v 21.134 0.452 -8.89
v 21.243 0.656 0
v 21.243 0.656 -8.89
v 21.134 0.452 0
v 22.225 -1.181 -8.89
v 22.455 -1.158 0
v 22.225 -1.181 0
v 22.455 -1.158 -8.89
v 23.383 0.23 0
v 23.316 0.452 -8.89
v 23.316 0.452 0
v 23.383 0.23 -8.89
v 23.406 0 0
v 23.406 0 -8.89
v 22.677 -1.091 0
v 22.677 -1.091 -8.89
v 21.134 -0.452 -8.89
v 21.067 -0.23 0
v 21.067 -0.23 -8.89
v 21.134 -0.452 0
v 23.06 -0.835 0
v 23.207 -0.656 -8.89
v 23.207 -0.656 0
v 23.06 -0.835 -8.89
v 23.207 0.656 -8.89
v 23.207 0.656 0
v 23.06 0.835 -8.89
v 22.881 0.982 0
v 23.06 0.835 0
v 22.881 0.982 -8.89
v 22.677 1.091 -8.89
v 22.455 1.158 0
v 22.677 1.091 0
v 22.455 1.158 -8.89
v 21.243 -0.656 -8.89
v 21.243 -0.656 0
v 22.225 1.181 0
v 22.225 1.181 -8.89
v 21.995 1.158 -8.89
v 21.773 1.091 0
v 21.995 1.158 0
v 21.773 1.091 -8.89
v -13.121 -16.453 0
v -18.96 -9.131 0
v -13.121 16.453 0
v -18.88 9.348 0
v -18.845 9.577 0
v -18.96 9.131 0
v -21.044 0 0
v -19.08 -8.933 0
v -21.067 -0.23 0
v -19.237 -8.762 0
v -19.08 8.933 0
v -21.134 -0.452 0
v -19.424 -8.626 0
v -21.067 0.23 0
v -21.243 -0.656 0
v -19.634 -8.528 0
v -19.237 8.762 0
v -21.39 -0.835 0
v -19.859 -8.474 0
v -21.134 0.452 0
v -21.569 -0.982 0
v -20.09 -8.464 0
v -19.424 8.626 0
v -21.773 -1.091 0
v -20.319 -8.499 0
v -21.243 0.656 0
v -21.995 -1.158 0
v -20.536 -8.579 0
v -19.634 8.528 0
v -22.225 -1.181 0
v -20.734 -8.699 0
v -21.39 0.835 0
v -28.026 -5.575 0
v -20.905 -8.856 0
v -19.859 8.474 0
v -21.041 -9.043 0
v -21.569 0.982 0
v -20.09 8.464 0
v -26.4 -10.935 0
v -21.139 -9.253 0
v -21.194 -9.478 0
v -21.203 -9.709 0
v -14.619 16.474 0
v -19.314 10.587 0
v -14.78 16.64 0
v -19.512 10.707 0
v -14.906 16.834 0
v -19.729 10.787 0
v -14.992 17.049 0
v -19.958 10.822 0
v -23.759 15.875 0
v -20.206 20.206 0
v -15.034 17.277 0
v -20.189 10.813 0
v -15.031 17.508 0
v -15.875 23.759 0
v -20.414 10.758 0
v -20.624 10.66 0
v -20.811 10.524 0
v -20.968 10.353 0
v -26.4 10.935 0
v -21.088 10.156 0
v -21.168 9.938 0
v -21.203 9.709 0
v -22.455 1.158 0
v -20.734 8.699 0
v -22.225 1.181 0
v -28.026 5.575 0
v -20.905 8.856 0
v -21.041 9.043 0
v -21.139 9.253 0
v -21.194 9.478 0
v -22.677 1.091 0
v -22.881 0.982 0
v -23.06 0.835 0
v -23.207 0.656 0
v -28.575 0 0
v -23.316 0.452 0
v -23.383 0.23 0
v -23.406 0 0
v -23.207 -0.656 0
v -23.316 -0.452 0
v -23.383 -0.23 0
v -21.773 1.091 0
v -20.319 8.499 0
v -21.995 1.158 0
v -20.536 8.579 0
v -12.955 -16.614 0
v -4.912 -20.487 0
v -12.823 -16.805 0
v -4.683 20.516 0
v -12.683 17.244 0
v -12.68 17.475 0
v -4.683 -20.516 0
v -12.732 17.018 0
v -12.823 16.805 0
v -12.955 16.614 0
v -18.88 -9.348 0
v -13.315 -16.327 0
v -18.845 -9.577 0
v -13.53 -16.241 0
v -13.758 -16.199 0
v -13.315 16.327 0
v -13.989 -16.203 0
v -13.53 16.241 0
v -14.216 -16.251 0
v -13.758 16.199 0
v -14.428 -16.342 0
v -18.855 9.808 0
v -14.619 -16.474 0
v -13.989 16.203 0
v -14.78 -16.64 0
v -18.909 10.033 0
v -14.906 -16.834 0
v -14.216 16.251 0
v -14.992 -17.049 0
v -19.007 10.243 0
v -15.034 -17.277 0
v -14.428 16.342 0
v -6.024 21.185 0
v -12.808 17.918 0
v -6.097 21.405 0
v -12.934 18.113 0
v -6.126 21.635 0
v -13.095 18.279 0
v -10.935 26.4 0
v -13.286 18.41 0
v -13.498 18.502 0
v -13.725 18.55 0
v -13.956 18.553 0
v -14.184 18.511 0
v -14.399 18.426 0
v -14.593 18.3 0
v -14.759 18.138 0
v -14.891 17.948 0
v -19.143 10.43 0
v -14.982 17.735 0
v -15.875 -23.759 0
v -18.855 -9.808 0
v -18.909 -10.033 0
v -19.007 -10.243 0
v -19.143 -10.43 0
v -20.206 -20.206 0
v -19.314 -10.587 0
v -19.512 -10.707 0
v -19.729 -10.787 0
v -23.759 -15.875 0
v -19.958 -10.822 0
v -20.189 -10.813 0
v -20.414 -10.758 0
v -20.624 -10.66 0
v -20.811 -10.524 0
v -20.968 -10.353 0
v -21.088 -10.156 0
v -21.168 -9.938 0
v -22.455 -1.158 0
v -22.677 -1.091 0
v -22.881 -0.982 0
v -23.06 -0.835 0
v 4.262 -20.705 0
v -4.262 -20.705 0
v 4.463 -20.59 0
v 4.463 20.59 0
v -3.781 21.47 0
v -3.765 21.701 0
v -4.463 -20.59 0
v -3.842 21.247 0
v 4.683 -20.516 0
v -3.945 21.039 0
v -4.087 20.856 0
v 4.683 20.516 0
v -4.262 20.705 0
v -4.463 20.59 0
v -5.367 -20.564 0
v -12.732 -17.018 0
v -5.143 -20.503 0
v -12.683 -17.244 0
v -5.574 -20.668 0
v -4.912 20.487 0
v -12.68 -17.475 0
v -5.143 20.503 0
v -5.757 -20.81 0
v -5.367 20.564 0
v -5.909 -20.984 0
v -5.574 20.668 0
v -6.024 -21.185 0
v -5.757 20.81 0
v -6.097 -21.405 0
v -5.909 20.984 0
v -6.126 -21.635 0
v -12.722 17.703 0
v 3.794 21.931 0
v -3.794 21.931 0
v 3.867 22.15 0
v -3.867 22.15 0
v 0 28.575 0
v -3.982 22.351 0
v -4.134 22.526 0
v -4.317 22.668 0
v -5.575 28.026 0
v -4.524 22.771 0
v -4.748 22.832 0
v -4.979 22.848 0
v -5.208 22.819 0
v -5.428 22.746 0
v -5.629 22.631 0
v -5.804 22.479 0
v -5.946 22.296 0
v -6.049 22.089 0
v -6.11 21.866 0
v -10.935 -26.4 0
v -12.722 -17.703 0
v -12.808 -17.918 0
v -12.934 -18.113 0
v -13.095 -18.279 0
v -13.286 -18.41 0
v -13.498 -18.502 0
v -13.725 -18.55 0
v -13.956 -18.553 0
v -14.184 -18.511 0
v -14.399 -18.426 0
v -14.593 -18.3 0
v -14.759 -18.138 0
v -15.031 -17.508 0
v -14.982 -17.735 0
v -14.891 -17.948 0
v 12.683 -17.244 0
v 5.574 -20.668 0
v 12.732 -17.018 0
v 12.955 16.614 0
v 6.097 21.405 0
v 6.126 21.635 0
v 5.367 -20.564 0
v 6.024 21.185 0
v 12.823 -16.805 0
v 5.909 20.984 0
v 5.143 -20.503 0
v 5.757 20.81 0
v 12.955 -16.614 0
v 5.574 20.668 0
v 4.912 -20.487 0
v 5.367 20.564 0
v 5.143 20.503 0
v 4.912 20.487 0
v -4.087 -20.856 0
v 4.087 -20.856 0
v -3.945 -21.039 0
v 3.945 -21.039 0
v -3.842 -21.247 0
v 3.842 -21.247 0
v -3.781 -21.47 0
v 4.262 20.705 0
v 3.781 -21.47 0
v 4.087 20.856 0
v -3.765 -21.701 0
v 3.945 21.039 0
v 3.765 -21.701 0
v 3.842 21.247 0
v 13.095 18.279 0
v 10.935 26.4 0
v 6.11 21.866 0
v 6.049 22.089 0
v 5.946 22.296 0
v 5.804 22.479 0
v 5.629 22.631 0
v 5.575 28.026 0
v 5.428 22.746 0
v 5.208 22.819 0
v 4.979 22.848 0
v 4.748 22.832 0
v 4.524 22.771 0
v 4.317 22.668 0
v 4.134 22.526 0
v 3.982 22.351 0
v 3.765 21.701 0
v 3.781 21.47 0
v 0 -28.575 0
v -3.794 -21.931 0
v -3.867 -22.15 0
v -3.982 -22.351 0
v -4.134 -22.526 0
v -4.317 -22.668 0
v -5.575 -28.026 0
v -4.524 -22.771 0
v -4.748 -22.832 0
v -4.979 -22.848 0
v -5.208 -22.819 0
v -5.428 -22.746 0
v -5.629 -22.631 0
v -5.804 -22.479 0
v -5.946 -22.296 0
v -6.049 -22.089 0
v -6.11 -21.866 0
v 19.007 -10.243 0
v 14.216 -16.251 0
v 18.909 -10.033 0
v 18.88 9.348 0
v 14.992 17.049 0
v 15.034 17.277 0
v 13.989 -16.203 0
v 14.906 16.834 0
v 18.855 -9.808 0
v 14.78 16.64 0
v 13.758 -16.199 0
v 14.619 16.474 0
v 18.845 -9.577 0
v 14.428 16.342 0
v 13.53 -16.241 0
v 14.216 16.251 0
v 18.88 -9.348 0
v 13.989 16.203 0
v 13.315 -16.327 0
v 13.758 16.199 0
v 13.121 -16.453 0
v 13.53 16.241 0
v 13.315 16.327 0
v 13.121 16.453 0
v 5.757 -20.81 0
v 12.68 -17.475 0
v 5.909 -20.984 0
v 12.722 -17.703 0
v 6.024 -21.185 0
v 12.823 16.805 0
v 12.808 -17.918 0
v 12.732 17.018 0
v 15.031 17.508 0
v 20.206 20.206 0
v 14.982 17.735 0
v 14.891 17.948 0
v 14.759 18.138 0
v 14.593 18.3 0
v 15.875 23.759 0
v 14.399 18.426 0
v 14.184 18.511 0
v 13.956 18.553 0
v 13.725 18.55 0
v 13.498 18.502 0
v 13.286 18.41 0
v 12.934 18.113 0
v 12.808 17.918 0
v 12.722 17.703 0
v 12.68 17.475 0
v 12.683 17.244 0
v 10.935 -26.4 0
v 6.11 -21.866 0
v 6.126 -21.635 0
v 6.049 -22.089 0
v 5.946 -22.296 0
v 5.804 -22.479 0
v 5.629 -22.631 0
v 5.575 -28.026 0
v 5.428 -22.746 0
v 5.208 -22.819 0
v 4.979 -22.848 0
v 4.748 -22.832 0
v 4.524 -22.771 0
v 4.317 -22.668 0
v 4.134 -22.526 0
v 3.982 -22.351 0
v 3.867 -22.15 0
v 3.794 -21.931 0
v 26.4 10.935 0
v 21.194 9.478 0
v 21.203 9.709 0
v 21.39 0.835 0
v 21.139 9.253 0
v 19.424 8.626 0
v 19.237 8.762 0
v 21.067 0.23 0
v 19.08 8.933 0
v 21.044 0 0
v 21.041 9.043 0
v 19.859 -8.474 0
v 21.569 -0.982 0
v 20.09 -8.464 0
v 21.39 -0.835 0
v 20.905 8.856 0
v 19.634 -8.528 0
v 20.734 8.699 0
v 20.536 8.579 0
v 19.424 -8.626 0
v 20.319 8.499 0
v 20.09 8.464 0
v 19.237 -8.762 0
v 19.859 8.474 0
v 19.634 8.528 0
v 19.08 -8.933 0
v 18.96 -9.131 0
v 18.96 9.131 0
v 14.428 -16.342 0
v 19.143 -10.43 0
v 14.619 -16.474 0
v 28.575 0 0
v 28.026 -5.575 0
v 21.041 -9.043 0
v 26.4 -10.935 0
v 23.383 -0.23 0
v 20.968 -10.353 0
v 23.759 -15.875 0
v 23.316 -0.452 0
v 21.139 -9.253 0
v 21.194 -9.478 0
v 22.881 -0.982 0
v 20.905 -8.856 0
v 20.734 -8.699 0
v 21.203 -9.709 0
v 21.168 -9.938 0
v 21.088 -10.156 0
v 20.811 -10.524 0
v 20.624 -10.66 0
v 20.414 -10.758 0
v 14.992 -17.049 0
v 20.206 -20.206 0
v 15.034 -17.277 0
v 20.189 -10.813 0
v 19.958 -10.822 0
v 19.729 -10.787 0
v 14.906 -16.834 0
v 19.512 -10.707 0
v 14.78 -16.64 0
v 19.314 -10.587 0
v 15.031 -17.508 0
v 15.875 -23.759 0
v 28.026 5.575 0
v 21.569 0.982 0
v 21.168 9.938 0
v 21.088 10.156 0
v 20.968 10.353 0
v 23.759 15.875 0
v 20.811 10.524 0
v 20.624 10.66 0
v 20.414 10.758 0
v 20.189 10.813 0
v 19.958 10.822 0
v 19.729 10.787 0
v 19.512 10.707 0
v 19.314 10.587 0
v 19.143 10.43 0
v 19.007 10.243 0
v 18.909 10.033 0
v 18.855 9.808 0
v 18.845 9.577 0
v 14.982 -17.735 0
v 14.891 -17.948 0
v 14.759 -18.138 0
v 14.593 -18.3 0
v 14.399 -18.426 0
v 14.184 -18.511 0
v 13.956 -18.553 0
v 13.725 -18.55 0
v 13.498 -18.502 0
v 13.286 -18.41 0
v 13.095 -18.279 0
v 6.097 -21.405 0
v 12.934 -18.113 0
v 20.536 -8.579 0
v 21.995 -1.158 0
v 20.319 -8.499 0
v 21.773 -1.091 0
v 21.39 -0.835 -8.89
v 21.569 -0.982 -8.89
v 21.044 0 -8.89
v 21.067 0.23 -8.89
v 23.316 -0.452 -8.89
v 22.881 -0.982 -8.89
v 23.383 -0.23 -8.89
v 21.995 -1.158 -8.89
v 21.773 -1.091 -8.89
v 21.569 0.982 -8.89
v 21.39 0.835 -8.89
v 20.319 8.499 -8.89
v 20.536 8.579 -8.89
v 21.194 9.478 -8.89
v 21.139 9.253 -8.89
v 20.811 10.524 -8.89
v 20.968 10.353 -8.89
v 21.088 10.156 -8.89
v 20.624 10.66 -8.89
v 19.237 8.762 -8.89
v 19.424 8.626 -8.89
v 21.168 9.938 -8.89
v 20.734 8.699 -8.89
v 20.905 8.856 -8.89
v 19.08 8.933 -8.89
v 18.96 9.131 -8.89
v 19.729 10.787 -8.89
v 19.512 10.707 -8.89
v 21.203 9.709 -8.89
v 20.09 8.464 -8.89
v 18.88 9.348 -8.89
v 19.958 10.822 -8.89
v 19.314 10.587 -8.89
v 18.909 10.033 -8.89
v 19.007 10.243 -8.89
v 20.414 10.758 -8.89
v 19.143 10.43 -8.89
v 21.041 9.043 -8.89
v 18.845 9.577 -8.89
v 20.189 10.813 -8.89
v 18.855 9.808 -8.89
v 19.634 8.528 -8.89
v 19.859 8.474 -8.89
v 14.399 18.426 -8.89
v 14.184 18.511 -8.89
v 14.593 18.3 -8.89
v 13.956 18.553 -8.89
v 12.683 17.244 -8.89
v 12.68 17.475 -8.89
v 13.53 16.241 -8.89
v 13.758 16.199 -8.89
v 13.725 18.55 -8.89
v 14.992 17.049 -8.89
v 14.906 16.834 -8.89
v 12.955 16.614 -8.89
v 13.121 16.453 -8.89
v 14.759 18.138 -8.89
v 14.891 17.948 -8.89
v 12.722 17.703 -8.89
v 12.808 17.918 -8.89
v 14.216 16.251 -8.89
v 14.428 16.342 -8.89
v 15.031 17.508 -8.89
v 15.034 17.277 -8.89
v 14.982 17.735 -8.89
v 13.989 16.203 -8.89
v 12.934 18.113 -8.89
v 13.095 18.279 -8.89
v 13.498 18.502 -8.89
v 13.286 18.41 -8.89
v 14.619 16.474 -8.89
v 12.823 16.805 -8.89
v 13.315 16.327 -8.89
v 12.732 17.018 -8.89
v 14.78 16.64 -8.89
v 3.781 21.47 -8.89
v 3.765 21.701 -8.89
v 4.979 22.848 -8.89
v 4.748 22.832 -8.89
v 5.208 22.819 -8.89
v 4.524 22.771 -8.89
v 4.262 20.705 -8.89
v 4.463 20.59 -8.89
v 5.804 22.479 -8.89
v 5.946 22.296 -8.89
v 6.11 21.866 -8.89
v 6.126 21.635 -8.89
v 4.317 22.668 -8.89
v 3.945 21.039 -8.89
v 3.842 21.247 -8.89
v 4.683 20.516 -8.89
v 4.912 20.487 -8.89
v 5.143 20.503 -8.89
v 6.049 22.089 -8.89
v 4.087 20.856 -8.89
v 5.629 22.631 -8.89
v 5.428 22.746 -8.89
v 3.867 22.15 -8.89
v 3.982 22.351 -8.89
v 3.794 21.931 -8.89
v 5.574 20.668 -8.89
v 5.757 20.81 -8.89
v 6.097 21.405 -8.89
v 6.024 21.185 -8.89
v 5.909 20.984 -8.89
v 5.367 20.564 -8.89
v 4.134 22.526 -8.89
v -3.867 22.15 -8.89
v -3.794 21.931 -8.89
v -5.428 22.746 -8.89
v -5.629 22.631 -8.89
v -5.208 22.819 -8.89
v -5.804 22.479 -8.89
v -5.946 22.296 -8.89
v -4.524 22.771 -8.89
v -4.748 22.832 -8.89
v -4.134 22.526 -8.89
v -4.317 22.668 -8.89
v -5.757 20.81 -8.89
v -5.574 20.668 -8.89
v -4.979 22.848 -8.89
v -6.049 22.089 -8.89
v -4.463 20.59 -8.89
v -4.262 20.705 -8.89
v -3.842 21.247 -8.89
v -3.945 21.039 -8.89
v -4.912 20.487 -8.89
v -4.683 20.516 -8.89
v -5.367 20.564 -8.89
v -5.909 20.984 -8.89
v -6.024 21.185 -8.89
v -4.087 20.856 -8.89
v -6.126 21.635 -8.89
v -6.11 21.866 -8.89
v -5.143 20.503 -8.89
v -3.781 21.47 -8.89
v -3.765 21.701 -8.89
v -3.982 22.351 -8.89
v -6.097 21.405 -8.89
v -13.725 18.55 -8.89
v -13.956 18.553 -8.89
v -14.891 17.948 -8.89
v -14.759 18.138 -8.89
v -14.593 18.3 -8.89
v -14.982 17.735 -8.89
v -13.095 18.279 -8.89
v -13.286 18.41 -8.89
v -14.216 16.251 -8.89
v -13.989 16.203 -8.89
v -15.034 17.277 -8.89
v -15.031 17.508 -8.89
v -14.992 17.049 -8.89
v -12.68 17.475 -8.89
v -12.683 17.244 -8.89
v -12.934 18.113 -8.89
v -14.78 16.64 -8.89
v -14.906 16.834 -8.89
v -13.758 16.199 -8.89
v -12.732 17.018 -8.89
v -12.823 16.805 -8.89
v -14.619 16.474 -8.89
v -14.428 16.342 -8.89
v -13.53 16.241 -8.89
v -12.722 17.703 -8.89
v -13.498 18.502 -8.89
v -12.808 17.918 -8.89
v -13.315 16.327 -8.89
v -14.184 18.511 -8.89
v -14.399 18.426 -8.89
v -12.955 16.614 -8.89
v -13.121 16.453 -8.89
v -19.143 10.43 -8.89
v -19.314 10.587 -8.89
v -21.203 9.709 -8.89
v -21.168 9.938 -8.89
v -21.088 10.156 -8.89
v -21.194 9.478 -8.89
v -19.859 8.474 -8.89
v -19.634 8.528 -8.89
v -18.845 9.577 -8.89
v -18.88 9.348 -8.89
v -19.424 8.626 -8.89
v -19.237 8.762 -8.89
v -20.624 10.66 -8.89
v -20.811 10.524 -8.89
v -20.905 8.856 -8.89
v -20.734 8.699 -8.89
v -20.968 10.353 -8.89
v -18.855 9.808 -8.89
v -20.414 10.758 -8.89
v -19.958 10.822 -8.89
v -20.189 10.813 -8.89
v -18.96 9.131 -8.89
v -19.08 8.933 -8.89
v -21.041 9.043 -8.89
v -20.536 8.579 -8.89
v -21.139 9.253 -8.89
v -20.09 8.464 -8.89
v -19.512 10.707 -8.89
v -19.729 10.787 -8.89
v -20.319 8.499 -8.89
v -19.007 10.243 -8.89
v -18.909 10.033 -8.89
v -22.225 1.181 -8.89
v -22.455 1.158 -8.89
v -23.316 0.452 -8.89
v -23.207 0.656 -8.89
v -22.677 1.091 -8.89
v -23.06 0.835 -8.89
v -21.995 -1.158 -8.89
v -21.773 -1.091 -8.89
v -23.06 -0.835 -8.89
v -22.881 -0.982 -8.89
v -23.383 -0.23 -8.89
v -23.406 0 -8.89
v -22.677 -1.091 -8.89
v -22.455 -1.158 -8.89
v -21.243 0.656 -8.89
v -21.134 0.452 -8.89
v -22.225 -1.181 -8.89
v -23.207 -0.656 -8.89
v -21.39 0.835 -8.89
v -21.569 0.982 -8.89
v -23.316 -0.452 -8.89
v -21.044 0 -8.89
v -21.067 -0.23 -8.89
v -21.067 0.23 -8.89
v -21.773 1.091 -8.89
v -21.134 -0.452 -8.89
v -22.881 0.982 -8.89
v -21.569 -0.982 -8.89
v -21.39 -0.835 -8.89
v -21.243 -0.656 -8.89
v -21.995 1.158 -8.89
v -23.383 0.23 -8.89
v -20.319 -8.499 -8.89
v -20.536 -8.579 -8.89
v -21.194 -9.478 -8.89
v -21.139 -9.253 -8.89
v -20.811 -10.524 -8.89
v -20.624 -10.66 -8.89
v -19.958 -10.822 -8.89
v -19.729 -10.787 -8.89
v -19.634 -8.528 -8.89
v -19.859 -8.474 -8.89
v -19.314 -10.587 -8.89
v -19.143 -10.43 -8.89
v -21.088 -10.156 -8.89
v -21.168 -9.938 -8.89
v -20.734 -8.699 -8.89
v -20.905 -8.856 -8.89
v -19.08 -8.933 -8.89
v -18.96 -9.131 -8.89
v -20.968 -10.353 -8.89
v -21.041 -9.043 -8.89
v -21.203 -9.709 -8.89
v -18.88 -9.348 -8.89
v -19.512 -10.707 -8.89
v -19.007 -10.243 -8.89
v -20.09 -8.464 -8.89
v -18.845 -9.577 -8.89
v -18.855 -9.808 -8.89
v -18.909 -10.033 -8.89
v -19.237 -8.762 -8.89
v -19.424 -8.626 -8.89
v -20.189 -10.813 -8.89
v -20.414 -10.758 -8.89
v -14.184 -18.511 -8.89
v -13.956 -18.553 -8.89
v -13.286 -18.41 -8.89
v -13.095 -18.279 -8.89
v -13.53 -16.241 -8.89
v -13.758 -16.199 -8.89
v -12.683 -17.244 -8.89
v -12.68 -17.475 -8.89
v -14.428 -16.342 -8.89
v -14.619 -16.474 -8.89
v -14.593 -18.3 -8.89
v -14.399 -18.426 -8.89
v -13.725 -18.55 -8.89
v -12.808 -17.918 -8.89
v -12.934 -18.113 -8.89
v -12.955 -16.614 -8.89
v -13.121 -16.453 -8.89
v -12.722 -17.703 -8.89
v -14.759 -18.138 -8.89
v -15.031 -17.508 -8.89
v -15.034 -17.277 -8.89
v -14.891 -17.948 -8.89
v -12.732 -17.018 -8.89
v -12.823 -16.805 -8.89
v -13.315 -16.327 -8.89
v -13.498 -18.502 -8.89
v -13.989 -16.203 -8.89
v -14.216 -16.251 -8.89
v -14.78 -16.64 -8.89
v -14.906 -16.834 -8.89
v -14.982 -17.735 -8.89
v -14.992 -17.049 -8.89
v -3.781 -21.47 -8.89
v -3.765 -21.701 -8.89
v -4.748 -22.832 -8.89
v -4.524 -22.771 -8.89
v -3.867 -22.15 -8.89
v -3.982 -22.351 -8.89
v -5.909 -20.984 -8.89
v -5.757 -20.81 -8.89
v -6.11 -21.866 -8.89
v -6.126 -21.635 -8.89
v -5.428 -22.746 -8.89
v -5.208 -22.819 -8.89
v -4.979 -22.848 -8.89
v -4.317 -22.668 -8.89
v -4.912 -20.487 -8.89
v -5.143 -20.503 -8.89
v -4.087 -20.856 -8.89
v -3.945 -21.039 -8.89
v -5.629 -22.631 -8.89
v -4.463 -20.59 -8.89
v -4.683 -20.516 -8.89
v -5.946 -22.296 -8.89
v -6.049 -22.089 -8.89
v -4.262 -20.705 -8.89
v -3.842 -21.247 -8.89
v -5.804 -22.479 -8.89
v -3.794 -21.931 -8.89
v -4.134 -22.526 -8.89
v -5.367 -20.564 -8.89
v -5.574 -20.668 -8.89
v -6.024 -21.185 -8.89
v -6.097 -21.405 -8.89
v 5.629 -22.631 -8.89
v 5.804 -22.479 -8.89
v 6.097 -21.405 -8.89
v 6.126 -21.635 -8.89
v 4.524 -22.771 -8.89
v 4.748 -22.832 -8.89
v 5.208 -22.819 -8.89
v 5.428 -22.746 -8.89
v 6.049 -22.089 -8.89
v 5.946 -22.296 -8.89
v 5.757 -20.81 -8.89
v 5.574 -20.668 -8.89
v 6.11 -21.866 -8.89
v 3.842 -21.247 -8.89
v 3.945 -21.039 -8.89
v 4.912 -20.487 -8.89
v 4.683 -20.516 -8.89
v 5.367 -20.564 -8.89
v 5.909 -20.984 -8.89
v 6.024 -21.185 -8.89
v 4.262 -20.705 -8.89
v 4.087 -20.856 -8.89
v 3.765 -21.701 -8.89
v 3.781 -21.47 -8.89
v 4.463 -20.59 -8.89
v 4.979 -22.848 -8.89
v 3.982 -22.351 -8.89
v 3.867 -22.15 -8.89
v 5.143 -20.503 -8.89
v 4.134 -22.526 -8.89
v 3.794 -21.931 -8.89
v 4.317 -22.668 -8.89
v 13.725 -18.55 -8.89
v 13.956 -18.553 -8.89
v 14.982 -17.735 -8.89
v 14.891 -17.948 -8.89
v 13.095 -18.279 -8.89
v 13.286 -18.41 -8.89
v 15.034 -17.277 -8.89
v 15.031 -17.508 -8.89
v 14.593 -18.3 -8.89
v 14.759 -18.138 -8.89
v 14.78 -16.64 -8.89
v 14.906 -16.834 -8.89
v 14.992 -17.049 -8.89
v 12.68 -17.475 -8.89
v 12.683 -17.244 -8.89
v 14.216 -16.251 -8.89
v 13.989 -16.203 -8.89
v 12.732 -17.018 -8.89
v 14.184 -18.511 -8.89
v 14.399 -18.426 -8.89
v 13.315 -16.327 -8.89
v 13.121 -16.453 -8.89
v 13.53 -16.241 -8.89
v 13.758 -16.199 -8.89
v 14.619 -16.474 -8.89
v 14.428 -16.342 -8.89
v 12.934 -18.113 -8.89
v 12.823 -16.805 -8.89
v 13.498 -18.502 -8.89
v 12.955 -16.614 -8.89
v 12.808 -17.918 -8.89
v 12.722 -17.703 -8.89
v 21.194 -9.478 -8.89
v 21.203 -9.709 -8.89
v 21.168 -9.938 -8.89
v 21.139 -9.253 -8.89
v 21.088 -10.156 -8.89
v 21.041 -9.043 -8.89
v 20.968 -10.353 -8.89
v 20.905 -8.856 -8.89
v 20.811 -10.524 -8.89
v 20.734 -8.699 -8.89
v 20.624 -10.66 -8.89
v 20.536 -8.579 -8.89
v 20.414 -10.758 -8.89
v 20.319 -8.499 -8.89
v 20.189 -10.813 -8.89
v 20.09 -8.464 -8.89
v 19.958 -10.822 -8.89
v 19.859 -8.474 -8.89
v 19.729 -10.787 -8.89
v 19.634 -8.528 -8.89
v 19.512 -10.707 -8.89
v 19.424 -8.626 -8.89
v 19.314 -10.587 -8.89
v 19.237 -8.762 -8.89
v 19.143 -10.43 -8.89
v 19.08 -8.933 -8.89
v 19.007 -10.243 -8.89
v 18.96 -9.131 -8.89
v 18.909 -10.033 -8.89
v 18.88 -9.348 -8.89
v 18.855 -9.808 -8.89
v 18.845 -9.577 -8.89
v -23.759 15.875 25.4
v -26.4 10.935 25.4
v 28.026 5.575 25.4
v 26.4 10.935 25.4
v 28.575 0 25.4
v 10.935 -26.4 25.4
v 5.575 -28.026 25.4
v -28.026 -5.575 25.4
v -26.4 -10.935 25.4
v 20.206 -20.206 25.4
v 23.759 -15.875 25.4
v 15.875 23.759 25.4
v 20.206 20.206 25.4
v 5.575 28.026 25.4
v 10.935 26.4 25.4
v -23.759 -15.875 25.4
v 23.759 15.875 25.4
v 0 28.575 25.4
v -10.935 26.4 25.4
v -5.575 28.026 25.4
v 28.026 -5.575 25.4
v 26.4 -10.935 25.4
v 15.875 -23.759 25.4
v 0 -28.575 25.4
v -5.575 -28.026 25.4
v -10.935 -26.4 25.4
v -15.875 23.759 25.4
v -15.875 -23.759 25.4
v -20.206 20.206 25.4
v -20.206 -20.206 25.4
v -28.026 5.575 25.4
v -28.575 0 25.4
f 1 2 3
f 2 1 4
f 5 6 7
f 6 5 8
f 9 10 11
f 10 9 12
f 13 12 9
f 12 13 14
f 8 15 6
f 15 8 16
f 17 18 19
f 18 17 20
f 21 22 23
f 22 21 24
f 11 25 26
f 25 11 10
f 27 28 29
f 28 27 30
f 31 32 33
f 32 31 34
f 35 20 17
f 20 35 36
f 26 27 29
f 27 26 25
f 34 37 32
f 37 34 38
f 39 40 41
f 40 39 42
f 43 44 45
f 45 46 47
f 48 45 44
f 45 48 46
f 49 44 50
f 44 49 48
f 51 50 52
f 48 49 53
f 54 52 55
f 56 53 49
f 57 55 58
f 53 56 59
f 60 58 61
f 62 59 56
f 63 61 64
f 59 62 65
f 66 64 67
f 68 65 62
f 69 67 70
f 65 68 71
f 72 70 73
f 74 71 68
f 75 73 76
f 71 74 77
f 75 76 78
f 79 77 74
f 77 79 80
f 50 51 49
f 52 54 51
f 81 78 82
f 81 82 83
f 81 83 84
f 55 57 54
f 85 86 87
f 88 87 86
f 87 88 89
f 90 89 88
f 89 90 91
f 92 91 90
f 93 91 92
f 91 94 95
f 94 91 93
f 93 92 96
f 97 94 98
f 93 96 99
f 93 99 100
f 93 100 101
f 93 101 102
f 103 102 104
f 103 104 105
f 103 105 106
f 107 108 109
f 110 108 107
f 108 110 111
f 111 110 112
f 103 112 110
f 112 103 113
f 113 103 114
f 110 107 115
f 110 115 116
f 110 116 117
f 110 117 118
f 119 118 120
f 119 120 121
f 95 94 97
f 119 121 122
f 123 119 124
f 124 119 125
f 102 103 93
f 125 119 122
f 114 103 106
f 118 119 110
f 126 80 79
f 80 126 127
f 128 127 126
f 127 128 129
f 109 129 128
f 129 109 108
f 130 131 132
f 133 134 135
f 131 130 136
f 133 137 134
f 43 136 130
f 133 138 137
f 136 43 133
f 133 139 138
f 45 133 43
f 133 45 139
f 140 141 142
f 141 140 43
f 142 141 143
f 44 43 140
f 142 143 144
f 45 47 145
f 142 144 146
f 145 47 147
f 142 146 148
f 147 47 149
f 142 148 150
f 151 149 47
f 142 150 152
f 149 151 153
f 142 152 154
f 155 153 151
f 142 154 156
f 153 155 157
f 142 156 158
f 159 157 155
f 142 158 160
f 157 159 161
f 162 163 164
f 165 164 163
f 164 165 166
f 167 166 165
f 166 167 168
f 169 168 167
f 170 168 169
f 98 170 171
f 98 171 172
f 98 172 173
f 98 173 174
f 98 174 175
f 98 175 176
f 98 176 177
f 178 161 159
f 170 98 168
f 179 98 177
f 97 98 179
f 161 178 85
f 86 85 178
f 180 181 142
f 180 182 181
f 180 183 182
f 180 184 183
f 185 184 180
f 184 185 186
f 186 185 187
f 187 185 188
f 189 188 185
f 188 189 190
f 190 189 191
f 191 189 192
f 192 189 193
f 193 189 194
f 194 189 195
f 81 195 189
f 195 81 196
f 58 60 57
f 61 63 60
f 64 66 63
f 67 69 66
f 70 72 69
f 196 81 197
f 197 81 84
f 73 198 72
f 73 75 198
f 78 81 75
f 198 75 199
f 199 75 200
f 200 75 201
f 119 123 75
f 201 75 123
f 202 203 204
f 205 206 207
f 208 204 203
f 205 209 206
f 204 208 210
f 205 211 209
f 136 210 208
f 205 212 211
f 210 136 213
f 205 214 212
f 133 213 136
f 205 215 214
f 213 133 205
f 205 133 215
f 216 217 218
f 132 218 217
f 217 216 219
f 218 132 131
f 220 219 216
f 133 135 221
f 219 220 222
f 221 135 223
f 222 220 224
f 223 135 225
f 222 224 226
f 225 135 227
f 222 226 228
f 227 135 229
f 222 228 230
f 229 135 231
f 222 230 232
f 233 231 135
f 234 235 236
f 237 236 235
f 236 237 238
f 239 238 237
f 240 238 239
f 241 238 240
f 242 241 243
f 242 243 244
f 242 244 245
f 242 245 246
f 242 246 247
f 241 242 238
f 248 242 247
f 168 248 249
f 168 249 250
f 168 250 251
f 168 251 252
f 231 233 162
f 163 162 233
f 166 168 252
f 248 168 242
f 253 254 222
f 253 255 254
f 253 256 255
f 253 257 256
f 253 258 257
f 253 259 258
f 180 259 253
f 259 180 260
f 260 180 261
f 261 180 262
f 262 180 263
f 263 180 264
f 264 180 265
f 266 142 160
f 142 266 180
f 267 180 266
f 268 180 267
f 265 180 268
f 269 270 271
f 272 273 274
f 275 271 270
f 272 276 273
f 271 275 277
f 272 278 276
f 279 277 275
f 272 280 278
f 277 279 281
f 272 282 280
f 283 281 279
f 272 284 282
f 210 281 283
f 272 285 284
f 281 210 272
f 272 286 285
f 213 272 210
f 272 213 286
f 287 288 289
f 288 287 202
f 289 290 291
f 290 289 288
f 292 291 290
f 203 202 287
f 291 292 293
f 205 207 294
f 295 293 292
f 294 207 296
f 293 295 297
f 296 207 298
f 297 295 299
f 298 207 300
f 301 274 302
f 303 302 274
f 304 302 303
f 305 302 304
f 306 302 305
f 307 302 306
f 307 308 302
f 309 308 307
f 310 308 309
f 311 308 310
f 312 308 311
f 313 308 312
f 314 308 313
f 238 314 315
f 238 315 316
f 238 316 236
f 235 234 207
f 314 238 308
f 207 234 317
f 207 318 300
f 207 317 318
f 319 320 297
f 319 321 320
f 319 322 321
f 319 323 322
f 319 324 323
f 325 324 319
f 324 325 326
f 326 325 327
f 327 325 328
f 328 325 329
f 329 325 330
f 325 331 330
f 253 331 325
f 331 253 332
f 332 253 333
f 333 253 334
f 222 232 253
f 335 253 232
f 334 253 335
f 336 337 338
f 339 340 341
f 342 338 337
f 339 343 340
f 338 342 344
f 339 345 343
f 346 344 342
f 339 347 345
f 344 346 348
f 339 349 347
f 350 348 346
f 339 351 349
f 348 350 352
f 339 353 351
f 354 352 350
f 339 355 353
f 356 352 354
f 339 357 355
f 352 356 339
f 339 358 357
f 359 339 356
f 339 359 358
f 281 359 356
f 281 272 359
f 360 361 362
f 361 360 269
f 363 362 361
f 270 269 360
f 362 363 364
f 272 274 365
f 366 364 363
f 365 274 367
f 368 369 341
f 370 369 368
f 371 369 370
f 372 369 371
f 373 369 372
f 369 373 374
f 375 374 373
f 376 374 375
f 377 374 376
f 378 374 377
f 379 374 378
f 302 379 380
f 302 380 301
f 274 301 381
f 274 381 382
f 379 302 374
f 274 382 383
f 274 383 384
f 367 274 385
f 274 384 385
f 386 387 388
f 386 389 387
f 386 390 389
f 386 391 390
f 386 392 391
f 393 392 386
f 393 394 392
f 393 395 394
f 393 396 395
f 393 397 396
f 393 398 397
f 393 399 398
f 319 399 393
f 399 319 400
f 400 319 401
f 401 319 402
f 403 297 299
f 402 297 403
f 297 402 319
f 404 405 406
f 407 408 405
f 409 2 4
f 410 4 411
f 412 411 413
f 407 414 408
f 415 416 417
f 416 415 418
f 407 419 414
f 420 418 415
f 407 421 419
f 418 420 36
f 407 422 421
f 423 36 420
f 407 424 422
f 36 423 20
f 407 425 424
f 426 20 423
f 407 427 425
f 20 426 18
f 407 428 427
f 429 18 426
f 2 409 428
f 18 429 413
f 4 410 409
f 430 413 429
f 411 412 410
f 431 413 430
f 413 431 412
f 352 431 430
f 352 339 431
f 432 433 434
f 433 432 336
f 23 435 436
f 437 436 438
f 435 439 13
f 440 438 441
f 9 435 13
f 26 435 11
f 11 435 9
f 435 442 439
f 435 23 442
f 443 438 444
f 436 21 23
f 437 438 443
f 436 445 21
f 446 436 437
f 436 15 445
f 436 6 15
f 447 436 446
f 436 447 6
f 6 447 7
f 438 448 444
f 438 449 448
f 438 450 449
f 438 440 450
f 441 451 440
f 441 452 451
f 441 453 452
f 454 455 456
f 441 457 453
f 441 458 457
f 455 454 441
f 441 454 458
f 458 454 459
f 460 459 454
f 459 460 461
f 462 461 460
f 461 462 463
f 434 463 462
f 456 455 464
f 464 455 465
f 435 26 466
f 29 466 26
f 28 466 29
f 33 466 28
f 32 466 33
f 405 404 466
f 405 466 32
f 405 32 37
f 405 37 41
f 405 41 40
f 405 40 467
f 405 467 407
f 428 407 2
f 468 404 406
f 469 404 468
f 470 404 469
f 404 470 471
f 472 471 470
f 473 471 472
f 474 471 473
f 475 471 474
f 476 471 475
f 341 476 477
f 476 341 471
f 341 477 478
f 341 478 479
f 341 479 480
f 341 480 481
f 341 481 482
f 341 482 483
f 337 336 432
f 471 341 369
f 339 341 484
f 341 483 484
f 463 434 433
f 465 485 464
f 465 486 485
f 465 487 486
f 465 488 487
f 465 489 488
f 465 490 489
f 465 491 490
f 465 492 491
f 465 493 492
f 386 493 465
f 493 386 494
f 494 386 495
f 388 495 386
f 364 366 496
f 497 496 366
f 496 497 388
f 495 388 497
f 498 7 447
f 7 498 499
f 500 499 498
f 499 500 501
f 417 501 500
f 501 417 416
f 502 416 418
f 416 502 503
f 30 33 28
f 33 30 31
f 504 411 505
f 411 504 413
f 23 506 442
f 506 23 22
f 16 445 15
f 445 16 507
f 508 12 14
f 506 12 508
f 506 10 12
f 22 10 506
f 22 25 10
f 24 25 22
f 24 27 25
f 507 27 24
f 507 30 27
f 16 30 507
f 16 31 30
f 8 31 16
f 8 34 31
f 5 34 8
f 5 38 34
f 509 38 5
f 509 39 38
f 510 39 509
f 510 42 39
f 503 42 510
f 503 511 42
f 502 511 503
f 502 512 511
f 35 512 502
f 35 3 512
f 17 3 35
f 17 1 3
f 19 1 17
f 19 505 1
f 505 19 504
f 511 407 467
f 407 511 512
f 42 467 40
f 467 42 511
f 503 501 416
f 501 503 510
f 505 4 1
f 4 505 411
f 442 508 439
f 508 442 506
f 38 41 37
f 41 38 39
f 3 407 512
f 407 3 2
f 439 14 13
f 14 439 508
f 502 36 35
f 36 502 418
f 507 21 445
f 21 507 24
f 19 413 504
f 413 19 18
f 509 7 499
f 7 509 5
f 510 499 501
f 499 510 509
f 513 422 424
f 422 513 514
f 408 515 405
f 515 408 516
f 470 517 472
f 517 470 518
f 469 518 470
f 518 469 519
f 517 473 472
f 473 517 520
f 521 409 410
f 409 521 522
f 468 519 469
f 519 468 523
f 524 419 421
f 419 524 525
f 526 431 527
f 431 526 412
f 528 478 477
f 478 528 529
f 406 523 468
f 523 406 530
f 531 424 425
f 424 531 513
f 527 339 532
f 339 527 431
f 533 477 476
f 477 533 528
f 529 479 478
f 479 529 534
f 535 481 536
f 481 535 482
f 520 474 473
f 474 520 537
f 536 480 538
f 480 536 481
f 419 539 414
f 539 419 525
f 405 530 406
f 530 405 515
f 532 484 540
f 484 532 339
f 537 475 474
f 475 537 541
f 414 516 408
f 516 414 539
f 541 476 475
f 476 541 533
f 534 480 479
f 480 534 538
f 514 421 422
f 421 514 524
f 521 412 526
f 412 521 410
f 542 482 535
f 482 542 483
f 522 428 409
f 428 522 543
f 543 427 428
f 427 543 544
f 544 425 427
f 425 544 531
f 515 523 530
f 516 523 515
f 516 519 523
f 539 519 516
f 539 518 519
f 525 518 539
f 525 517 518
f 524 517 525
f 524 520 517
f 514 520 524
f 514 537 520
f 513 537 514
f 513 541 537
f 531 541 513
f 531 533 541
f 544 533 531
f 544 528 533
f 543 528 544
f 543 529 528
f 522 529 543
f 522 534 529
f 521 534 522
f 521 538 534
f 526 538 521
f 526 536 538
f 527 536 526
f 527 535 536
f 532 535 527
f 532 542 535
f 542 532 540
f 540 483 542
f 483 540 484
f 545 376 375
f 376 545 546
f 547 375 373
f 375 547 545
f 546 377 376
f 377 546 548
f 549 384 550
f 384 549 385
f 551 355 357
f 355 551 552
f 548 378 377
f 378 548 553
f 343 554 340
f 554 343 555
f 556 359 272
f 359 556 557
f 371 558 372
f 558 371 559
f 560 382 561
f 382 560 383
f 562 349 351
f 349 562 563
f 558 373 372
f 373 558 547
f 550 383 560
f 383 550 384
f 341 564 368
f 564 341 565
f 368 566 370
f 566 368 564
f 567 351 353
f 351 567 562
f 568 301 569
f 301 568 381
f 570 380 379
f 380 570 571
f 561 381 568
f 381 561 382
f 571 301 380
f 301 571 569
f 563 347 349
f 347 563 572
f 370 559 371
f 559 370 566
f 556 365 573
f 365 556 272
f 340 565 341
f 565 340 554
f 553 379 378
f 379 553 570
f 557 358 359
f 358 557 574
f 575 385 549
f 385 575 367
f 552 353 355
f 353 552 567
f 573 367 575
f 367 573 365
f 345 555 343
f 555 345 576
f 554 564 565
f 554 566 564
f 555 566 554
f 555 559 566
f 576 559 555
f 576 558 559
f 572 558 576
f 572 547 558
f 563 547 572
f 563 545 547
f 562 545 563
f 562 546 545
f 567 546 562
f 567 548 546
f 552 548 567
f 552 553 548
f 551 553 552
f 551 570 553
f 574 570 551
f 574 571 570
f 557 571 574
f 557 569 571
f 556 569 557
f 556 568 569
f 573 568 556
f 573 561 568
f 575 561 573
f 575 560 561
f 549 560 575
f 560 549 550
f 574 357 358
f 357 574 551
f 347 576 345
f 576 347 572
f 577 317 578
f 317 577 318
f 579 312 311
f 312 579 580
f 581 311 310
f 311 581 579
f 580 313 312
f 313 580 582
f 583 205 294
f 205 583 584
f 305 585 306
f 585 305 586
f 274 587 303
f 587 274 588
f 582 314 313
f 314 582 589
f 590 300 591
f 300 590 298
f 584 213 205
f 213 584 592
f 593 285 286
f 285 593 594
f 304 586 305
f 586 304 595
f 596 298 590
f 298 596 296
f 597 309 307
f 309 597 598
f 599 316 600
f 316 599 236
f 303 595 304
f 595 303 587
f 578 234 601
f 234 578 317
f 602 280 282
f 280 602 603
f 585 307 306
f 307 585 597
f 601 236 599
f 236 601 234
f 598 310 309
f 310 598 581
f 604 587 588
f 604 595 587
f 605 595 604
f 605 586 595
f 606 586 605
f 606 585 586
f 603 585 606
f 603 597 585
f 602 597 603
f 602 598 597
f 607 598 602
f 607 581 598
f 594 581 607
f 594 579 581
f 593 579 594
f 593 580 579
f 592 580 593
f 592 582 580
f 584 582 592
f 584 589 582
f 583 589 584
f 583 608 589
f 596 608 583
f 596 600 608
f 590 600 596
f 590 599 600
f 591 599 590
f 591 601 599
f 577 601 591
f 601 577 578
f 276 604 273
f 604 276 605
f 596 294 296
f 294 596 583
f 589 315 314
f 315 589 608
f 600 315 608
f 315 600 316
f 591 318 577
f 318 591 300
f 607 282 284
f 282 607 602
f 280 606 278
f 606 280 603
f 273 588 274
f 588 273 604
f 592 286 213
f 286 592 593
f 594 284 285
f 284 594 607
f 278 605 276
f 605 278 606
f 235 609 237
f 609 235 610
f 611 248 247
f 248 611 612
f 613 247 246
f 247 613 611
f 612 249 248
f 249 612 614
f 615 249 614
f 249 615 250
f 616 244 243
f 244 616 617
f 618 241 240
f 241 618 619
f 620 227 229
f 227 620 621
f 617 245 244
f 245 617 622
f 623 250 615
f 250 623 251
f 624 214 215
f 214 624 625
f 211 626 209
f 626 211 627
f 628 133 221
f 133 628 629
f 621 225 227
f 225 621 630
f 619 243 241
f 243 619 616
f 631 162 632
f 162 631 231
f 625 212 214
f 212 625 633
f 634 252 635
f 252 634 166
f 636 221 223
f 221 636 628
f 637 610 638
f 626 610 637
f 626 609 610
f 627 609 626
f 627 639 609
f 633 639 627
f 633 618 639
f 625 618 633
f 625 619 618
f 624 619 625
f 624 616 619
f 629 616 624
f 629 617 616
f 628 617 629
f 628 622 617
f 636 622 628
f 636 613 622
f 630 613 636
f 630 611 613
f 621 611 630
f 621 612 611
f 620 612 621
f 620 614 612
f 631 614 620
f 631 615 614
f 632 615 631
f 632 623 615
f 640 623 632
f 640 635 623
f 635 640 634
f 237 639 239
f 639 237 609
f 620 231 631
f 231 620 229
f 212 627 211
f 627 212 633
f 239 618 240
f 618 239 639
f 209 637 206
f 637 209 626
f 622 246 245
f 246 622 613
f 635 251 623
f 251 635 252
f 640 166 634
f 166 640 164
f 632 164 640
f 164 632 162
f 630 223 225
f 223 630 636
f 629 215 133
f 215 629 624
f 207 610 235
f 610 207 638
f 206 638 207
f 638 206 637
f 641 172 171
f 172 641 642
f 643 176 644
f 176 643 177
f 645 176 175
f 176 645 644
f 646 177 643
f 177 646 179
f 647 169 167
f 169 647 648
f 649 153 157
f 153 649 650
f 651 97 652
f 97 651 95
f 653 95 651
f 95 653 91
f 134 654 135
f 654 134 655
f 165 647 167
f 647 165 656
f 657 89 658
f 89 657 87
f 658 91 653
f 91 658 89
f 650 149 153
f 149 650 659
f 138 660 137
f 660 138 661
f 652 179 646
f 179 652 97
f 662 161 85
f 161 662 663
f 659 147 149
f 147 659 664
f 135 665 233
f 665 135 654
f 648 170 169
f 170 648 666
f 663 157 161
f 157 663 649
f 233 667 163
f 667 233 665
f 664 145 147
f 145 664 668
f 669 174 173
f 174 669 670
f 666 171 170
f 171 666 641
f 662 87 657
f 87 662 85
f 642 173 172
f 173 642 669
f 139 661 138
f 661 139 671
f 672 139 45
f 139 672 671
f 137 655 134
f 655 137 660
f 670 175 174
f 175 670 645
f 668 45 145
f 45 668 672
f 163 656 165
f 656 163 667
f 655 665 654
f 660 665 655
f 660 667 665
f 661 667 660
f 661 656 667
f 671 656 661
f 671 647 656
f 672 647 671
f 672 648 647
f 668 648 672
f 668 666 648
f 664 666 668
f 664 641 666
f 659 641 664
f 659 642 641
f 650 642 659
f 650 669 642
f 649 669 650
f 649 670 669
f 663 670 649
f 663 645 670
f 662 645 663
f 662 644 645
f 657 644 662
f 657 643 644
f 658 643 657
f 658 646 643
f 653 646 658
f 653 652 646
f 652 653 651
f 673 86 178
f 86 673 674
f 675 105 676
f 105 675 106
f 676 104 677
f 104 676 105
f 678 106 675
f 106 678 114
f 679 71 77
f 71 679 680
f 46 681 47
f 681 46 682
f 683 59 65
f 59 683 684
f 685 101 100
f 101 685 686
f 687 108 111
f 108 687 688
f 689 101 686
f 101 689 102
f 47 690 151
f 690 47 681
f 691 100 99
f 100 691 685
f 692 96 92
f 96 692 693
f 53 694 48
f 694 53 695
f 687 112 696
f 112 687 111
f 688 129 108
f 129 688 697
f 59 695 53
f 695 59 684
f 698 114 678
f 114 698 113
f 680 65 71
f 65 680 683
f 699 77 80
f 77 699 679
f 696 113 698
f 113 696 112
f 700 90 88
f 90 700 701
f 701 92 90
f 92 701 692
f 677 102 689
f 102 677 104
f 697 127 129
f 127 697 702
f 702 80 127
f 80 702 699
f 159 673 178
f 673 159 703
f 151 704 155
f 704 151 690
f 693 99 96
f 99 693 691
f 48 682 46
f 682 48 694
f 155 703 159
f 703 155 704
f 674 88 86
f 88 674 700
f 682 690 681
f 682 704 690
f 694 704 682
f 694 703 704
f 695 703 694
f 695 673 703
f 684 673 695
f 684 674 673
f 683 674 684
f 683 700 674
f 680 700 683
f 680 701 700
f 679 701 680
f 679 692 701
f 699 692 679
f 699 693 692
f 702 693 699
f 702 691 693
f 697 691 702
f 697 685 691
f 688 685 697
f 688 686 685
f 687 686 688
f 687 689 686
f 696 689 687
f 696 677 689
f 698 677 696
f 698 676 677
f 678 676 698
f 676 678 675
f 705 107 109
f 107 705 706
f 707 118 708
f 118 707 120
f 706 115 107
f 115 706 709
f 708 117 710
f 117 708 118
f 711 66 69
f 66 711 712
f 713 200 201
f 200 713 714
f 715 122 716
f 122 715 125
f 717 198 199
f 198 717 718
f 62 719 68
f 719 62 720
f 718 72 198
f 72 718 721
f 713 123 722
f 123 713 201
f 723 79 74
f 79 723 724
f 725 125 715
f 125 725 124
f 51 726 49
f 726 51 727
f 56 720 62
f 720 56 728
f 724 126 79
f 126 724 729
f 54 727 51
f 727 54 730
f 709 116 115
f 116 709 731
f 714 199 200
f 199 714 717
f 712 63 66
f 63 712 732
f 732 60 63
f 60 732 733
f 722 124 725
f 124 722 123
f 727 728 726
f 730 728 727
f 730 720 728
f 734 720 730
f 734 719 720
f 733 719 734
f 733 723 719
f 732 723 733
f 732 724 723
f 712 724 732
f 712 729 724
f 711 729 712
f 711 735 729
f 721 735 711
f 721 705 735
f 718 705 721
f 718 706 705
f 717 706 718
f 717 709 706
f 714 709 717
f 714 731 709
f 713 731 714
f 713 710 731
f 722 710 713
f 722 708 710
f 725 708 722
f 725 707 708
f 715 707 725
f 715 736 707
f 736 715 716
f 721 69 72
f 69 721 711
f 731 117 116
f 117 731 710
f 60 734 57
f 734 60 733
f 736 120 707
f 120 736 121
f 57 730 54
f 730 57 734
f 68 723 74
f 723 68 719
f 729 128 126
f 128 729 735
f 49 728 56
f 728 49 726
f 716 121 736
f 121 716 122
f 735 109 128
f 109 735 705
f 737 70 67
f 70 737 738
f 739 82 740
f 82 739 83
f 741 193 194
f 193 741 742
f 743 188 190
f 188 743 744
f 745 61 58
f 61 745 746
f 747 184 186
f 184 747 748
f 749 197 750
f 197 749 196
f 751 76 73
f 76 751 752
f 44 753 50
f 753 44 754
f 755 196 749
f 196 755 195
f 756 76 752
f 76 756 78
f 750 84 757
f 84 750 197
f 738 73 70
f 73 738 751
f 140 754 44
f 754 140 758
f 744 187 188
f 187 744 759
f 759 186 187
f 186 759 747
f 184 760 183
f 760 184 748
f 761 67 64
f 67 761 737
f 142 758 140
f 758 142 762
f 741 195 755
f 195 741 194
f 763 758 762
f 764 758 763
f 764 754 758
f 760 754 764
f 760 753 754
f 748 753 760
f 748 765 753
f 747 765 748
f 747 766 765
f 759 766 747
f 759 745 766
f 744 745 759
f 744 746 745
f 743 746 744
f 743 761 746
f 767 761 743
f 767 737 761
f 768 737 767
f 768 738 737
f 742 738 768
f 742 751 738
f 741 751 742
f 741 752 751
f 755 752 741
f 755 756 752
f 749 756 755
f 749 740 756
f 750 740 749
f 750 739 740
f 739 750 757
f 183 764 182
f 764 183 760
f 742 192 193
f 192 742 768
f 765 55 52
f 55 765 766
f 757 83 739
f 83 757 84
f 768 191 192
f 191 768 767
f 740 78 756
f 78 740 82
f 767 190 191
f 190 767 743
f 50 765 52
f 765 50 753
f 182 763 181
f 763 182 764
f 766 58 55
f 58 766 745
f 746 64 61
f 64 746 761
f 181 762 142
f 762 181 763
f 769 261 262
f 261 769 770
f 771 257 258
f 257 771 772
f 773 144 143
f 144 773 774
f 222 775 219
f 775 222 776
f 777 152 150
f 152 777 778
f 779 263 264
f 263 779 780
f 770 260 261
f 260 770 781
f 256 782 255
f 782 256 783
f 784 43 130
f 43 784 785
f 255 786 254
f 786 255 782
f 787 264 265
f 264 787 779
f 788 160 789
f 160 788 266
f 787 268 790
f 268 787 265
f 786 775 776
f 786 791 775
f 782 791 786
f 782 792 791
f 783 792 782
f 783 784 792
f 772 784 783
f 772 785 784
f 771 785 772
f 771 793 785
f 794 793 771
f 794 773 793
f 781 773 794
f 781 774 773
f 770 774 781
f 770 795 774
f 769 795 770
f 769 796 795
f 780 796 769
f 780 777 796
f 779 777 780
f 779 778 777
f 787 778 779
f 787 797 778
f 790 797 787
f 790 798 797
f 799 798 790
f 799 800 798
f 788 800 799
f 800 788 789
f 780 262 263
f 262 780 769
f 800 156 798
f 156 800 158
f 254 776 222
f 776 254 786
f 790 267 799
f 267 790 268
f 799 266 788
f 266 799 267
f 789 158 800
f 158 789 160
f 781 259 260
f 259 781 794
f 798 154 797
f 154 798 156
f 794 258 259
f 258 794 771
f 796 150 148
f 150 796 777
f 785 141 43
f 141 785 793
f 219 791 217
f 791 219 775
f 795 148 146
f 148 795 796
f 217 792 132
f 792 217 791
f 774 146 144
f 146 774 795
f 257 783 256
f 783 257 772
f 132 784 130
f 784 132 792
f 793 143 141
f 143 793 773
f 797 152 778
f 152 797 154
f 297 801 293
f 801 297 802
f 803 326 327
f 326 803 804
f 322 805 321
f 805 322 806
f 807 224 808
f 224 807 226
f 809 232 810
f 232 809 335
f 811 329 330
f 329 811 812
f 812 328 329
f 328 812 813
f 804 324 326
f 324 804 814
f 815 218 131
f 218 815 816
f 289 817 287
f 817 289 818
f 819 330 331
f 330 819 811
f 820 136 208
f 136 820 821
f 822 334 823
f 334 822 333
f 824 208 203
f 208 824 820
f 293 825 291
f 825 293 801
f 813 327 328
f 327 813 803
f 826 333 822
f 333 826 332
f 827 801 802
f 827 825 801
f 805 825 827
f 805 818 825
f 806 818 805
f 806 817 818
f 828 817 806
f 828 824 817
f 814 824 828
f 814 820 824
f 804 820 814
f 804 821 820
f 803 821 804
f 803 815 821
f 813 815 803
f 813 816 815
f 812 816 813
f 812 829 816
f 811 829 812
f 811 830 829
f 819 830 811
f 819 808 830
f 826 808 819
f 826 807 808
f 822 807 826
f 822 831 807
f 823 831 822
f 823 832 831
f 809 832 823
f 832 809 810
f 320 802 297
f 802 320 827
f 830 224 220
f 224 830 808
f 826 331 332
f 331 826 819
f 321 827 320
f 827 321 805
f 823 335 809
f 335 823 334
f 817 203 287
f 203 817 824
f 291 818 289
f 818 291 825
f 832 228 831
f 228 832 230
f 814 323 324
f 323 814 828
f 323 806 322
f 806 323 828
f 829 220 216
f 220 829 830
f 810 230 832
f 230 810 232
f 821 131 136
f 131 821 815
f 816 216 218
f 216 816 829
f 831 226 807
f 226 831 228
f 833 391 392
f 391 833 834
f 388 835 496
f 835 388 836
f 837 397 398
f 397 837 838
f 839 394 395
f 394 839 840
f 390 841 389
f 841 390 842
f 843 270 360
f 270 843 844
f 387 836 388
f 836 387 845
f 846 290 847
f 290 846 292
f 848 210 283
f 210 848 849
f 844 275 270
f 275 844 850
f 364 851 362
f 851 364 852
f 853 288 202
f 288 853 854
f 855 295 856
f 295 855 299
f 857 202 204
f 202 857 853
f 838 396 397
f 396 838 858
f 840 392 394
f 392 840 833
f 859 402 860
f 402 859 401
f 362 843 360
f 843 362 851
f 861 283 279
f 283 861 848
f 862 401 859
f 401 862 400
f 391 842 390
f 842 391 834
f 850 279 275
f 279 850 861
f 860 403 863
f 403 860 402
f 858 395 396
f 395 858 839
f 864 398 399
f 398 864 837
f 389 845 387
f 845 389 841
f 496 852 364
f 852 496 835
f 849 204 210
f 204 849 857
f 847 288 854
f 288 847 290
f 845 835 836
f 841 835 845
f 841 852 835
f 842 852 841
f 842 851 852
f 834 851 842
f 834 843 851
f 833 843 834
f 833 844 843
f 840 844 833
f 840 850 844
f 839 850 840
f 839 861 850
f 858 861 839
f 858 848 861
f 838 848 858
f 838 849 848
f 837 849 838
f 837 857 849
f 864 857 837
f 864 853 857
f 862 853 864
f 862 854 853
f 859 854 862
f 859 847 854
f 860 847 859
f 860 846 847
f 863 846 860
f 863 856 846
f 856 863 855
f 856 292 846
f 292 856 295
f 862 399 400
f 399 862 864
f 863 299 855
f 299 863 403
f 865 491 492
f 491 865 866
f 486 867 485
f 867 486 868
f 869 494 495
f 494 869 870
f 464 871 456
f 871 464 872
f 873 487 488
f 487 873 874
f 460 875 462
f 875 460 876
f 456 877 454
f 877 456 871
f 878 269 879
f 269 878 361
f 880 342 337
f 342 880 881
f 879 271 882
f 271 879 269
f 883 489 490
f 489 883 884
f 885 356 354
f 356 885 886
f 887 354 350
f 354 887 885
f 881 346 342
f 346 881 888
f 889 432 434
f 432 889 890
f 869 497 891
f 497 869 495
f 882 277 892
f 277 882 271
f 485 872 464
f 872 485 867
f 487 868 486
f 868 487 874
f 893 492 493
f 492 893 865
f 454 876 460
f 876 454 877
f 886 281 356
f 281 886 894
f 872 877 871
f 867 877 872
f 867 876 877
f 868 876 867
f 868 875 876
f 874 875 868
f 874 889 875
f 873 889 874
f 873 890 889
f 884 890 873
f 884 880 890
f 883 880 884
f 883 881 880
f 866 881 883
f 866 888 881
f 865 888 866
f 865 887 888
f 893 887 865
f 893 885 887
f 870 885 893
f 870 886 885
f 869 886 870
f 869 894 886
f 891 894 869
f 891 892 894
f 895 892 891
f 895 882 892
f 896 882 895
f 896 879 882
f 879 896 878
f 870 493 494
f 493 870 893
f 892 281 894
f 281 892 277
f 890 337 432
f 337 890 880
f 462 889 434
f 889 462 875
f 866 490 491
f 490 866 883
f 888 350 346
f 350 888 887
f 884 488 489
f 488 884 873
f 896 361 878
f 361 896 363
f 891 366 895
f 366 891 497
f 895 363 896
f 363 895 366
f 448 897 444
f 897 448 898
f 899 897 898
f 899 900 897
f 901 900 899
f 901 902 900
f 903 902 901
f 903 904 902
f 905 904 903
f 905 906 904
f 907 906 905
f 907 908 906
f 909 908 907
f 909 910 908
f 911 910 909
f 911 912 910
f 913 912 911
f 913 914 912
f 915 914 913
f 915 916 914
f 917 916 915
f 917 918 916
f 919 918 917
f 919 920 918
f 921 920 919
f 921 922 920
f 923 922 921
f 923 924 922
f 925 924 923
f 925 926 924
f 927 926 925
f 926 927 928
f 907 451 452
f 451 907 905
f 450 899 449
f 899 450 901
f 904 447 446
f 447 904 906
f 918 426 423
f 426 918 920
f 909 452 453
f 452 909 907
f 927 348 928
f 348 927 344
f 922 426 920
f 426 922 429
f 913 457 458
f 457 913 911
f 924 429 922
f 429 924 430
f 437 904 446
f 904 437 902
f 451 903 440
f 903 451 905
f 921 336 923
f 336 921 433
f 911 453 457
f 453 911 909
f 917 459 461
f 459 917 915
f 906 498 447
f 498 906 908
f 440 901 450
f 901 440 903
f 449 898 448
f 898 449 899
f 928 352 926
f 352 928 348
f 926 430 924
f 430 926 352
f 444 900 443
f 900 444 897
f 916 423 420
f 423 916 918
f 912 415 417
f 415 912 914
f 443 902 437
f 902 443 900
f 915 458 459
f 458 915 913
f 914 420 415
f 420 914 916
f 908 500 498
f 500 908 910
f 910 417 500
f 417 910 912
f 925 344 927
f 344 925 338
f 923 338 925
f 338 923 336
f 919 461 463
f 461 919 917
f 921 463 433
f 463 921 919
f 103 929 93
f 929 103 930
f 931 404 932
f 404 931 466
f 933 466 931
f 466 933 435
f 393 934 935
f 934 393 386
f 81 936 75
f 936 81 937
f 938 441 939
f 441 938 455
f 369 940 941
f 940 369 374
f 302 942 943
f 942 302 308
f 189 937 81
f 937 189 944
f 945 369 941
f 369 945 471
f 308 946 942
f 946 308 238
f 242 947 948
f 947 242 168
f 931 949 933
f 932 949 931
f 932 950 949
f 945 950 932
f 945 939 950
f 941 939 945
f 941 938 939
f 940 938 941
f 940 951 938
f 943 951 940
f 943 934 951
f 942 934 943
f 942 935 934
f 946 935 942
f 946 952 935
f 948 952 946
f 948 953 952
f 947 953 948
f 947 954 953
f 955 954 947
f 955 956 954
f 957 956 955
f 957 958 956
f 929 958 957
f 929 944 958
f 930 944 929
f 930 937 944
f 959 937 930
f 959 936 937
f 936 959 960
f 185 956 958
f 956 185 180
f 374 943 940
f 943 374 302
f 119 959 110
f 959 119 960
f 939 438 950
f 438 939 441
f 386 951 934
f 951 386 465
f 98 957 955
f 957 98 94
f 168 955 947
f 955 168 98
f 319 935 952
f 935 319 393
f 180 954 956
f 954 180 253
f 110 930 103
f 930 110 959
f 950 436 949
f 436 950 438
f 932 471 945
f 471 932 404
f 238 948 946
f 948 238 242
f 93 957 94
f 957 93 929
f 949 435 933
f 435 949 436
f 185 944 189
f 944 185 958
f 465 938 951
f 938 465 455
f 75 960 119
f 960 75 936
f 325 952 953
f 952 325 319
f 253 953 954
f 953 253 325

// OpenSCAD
//
// 3BP1 CRT, somewhat crude
//

mm = 25.4;
e = 0.1;

$fn = 32;

// origin at center of base in the plane of the PCB more or less

module tube() {
     // neck
     cylinder( h=(5.38+e)*mm, d=2*mm);
     // top
     translate( [0, 0, 5.38*mm])
     cylinder( h=3.875*mm, d1=2*mm, d2=3.063*mm);
}

// pin circle
pin_dia = 0.093*mm;
pin_cir = (1.75/2)*mm;
pin_len = 0.35*mm;

module base() {
     color( "black") {
	  cylinder( h=1*mm, d=2.25*mm);
     }
     color( "silver") {
	  for( a=[0:14]) {
		    rotate( [0, 0, (360/14)*a])
	       translate( [ pin_cir, 0, -pin_len])
		    cylinder( h=pin_len, d=pin_dia);
	  }
     }
}

% tube();
base();
